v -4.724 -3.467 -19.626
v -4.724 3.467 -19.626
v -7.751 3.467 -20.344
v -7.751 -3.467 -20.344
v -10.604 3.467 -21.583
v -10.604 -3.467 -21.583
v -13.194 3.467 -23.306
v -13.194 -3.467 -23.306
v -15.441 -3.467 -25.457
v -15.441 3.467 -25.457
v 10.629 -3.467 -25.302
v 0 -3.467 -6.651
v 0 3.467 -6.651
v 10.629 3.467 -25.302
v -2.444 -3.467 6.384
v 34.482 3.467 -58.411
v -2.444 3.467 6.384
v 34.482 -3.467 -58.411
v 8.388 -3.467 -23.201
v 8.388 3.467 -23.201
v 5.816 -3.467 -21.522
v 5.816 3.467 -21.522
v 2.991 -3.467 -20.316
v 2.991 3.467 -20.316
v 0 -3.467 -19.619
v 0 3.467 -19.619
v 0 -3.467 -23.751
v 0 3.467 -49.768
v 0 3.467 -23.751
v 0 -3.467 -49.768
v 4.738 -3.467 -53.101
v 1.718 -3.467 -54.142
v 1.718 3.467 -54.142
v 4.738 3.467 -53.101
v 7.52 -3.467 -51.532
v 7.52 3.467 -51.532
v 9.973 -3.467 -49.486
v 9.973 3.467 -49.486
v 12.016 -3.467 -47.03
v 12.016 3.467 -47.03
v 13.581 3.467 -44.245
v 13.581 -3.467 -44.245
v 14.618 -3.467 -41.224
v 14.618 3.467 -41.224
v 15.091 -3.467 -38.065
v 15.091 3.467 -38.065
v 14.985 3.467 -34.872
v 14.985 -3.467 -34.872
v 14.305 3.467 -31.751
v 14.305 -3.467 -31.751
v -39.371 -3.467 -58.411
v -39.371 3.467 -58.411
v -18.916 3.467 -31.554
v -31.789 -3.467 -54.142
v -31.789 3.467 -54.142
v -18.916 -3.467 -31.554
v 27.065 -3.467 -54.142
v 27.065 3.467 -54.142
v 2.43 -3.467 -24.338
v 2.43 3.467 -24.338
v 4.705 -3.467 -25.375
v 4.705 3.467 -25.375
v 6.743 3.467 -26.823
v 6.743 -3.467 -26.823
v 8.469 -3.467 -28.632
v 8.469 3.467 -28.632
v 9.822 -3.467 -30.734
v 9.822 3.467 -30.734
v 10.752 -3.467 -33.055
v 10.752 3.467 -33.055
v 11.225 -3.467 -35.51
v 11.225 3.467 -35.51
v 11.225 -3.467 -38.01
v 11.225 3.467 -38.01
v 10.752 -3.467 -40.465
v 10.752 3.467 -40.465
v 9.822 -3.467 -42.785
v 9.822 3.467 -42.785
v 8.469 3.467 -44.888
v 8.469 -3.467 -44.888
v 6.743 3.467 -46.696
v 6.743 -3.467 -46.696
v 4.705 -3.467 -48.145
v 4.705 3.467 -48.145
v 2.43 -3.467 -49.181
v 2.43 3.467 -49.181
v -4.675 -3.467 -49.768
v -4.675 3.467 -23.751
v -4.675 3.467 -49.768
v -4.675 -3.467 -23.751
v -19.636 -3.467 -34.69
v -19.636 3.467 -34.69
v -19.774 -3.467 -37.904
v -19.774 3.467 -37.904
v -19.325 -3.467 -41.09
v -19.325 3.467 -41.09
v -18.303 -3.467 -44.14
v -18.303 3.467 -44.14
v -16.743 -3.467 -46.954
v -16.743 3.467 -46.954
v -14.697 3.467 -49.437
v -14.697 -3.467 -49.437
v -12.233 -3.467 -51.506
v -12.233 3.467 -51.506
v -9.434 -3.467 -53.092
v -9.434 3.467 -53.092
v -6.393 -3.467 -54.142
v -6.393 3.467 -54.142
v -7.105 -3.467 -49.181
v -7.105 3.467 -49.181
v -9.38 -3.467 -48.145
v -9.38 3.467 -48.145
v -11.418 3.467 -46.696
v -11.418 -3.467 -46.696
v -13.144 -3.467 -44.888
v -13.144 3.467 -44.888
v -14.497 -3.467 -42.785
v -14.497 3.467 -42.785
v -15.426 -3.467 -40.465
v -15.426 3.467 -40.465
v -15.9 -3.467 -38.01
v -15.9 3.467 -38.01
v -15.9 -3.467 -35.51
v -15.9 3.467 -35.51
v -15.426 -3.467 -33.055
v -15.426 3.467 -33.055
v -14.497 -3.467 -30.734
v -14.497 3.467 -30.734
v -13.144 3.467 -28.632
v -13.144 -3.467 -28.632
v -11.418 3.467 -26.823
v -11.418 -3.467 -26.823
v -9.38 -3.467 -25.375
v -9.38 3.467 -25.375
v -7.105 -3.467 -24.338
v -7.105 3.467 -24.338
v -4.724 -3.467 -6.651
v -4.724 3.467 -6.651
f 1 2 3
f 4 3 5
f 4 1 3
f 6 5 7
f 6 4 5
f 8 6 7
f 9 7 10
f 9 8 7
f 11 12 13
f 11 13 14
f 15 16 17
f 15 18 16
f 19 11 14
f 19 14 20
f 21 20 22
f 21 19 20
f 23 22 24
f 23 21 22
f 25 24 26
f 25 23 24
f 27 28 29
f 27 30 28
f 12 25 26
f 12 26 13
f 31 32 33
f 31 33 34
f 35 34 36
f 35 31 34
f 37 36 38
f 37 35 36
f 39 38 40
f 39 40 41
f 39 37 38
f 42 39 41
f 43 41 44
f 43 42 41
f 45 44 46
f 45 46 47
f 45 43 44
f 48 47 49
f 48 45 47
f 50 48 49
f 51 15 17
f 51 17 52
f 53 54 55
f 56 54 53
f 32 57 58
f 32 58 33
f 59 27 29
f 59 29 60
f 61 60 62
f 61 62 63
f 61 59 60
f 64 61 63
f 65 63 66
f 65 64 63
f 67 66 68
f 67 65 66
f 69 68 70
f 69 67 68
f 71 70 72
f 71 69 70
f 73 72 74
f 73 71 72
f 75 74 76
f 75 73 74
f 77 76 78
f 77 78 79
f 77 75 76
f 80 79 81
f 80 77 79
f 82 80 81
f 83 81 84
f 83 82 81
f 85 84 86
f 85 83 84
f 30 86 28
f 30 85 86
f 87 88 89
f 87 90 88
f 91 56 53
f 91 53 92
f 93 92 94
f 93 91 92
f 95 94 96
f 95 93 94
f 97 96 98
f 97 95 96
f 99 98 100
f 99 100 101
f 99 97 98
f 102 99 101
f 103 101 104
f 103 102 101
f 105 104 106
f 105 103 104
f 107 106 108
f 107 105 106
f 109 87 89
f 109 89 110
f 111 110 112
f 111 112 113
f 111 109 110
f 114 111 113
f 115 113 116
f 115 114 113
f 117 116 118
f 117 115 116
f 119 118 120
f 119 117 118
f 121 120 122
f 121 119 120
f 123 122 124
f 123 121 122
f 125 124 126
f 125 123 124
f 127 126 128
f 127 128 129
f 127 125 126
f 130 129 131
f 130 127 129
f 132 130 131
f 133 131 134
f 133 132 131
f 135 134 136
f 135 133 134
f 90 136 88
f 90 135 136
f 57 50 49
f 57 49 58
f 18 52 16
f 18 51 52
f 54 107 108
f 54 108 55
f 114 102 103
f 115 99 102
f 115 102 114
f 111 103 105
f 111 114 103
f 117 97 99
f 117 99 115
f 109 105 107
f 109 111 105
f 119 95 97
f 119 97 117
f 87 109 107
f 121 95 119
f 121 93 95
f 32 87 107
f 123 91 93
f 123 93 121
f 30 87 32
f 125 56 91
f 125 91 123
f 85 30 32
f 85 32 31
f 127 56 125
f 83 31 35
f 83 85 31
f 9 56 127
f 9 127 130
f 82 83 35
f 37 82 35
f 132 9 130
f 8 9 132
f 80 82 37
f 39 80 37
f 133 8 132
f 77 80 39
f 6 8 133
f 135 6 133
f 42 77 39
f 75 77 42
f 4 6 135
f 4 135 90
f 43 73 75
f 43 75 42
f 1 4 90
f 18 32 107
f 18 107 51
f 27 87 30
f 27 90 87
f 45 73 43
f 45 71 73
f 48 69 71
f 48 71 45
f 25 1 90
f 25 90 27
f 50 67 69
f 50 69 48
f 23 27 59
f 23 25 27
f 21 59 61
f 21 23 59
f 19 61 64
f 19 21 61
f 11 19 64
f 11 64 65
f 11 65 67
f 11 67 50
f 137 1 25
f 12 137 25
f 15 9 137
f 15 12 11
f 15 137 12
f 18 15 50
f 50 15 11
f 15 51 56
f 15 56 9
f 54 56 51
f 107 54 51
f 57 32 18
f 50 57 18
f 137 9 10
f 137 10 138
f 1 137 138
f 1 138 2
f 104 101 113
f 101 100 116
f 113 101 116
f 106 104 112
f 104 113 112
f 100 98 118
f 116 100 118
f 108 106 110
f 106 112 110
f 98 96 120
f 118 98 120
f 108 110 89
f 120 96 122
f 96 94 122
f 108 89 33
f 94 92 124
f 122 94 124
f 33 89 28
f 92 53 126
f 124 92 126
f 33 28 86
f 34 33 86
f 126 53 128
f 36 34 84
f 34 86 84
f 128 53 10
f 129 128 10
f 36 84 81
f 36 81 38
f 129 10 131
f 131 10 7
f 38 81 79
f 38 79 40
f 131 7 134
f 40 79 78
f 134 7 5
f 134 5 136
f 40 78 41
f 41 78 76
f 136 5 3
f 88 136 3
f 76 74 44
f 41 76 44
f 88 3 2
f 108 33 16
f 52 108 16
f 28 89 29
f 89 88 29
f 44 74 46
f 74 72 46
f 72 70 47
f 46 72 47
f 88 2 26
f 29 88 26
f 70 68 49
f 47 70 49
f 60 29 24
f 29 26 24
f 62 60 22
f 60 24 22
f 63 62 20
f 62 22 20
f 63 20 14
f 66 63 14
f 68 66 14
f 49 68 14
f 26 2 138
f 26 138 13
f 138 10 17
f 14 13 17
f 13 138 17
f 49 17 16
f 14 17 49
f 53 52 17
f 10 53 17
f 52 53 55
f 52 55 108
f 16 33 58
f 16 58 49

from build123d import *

# Parameters (mm, degrees)
F1_DEPTH = 3.4671
F3_DEPTH = 3.4671


with BuildPart() as f1:
    # F0 (on Front) → F1 (new body, symmetric)
    with BuildSketch(Plane.XZ):
        with BuildLine():
            ThreePointArc((-6.109759, -54.209232), (-2.337391, -54.560416), (1.434976, -54.209232))
            ThreePointArc((1.434976, -54.209232), (15.105103, -36.31727), (0, -19.61905))
            ThreePointArc((0, -19.61905), (-2.337391, -19.35588), (-4.674783, -19.61905))
            ThreePointArc((-4.674783, -19.61905), (-19.779886, -36.31727), (-6.109759, -54.209232))
        make_face()
        with BuildLine():
            ThreePointArc((-4.674783, -49.768269), (-15.959539, -36.759722), (-4.674783, -23.751175))
            Line((-4.674783, -23.751175), (-4.674783, -49.768269))
        make_face(mode=Mode.SUBTRACT)
        with BuildLine():
            ThreePointArc((0, -23.751175), (11.284756, -36.759722), (0, -49.768269))
            Line((0, -49.768269), (0, -23.751175))
        make_face(mode=Mode.SUBTRACT)
    extrude(amount=F1_DEPTH, both=True)

    # F2 (on Front) → F3 (join, symmetric)
    with BuildSketch(Plane.XZ):
        Polygon((34.482322, -58.411262), (-2.444447, 6.384362), (-39.371216, -58.411262), align=None)
        with BuildLine():
            Line((0, -19.747701), (0, -6.65056))
            Line((0, -6.65056), (27.065229, -54.14208))
            Line((27.065229, -54.14208), (-31.788915, -54.14208))
            Line((-31.788915, -54.14208), (-4.723686, -6.65056))
            Line((-4.723686, -6.65056), (-4.723686, -19.747701))
            ThreePointArc((-4.723686, -19.747701), (-2.361843, -19.393884), (0, -19.747701))
        make_face(mode=Mode.SUBTRACT)
    extrude(amount=F3_DEPTH, both=True)


solid = f1.part
